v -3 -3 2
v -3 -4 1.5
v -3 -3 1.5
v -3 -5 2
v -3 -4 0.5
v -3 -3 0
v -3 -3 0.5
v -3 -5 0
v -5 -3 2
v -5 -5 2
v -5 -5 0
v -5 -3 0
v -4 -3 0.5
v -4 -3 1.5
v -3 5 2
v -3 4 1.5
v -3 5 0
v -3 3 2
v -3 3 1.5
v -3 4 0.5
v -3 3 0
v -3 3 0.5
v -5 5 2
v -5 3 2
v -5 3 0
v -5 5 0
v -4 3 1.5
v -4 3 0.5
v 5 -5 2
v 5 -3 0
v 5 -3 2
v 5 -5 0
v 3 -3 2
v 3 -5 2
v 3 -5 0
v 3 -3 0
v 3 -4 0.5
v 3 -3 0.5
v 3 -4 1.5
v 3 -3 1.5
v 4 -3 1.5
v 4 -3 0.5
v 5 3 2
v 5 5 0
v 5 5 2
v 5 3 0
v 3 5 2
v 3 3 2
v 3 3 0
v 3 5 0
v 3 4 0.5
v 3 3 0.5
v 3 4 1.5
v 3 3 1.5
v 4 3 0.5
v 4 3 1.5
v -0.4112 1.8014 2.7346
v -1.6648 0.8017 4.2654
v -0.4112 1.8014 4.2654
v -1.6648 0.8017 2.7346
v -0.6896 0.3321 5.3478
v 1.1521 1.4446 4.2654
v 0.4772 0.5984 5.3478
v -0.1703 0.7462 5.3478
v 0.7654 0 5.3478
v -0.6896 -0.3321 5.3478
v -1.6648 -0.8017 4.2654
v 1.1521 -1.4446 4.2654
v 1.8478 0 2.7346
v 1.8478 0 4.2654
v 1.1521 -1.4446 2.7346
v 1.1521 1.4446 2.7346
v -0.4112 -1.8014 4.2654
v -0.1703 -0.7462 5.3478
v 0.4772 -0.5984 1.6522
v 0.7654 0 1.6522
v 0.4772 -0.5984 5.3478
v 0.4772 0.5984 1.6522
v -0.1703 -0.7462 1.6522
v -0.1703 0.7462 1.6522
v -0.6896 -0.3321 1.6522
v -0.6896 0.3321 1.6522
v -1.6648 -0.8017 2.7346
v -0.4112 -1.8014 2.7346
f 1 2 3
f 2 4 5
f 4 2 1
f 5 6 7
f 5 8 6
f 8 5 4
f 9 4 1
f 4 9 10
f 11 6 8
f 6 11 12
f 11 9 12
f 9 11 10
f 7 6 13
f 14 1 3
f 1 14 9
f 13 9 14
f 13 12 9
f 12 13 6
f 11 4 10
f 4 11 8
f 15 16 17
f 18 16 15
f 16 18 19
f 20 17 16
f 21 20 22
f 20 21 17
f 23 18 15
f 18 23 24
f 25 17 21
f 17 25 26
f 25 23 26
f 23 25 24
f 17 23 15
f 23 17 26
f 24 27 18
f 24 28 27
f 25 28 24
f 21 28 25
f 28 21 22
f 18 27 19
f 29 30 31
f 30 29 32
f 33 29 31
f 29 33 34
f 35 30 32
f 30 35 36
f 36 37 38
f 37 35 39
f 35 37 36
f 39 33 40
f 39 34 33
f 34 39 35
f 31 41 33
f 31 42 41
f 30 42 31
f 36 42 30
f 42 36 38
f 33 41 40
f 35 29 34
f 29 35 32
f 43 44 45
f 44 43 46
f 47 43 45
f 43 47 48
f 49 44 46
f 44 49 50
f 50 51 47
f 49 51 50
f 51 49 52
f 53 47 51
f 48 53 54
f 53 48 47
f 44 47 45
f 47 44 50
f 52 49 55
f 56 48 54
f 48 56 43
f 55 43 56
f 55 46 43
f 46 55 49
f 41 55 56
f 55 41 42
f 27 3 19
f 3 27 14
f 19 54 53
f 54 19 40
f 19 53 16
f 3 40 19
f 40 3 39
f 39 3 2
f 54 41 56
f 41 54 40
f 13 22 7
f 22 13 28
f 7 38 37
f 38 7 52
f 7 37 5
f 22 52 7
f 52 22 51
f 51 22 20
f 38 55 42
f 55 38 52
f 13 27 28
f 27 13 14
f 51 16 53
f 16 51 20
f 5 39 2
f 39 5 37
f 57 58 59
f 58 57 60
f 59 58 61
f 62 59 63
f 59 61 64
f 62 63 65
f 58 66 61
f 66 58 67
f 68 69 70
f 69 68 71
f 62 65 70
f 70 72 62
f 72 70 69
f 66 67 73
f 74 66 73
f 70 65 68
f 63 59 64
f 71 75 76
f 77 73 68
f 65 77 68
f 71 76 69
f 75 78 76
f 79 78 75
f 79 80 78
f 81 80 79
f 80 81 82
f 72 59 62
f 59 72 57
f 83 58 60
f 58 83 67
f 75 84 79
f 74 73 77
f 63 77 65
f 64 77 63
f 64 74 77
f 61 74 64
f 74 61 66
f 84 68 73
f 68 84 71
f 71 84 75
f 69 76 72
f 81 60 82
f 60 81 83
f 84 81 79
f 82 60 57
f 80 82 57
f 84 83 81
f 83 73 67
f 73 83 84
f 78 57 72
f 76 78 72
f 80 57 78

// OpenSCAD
union() {
    translate ([-5, -5, 0])
        cube([2, 2, 2]);
    translate ([-5, 3, 0])
        cube([2, 2, 2]);
    translate ([3, -5, 0])
        cube([2, 2, 2]);
    translate ([3, 3, 0])
        cube([2, 2, 2]);
    translate ([-4, -4, 0.5])
        cube([8, 8, 1]);
    translate([0, 0, 3.5])
        sphere(2);
}
